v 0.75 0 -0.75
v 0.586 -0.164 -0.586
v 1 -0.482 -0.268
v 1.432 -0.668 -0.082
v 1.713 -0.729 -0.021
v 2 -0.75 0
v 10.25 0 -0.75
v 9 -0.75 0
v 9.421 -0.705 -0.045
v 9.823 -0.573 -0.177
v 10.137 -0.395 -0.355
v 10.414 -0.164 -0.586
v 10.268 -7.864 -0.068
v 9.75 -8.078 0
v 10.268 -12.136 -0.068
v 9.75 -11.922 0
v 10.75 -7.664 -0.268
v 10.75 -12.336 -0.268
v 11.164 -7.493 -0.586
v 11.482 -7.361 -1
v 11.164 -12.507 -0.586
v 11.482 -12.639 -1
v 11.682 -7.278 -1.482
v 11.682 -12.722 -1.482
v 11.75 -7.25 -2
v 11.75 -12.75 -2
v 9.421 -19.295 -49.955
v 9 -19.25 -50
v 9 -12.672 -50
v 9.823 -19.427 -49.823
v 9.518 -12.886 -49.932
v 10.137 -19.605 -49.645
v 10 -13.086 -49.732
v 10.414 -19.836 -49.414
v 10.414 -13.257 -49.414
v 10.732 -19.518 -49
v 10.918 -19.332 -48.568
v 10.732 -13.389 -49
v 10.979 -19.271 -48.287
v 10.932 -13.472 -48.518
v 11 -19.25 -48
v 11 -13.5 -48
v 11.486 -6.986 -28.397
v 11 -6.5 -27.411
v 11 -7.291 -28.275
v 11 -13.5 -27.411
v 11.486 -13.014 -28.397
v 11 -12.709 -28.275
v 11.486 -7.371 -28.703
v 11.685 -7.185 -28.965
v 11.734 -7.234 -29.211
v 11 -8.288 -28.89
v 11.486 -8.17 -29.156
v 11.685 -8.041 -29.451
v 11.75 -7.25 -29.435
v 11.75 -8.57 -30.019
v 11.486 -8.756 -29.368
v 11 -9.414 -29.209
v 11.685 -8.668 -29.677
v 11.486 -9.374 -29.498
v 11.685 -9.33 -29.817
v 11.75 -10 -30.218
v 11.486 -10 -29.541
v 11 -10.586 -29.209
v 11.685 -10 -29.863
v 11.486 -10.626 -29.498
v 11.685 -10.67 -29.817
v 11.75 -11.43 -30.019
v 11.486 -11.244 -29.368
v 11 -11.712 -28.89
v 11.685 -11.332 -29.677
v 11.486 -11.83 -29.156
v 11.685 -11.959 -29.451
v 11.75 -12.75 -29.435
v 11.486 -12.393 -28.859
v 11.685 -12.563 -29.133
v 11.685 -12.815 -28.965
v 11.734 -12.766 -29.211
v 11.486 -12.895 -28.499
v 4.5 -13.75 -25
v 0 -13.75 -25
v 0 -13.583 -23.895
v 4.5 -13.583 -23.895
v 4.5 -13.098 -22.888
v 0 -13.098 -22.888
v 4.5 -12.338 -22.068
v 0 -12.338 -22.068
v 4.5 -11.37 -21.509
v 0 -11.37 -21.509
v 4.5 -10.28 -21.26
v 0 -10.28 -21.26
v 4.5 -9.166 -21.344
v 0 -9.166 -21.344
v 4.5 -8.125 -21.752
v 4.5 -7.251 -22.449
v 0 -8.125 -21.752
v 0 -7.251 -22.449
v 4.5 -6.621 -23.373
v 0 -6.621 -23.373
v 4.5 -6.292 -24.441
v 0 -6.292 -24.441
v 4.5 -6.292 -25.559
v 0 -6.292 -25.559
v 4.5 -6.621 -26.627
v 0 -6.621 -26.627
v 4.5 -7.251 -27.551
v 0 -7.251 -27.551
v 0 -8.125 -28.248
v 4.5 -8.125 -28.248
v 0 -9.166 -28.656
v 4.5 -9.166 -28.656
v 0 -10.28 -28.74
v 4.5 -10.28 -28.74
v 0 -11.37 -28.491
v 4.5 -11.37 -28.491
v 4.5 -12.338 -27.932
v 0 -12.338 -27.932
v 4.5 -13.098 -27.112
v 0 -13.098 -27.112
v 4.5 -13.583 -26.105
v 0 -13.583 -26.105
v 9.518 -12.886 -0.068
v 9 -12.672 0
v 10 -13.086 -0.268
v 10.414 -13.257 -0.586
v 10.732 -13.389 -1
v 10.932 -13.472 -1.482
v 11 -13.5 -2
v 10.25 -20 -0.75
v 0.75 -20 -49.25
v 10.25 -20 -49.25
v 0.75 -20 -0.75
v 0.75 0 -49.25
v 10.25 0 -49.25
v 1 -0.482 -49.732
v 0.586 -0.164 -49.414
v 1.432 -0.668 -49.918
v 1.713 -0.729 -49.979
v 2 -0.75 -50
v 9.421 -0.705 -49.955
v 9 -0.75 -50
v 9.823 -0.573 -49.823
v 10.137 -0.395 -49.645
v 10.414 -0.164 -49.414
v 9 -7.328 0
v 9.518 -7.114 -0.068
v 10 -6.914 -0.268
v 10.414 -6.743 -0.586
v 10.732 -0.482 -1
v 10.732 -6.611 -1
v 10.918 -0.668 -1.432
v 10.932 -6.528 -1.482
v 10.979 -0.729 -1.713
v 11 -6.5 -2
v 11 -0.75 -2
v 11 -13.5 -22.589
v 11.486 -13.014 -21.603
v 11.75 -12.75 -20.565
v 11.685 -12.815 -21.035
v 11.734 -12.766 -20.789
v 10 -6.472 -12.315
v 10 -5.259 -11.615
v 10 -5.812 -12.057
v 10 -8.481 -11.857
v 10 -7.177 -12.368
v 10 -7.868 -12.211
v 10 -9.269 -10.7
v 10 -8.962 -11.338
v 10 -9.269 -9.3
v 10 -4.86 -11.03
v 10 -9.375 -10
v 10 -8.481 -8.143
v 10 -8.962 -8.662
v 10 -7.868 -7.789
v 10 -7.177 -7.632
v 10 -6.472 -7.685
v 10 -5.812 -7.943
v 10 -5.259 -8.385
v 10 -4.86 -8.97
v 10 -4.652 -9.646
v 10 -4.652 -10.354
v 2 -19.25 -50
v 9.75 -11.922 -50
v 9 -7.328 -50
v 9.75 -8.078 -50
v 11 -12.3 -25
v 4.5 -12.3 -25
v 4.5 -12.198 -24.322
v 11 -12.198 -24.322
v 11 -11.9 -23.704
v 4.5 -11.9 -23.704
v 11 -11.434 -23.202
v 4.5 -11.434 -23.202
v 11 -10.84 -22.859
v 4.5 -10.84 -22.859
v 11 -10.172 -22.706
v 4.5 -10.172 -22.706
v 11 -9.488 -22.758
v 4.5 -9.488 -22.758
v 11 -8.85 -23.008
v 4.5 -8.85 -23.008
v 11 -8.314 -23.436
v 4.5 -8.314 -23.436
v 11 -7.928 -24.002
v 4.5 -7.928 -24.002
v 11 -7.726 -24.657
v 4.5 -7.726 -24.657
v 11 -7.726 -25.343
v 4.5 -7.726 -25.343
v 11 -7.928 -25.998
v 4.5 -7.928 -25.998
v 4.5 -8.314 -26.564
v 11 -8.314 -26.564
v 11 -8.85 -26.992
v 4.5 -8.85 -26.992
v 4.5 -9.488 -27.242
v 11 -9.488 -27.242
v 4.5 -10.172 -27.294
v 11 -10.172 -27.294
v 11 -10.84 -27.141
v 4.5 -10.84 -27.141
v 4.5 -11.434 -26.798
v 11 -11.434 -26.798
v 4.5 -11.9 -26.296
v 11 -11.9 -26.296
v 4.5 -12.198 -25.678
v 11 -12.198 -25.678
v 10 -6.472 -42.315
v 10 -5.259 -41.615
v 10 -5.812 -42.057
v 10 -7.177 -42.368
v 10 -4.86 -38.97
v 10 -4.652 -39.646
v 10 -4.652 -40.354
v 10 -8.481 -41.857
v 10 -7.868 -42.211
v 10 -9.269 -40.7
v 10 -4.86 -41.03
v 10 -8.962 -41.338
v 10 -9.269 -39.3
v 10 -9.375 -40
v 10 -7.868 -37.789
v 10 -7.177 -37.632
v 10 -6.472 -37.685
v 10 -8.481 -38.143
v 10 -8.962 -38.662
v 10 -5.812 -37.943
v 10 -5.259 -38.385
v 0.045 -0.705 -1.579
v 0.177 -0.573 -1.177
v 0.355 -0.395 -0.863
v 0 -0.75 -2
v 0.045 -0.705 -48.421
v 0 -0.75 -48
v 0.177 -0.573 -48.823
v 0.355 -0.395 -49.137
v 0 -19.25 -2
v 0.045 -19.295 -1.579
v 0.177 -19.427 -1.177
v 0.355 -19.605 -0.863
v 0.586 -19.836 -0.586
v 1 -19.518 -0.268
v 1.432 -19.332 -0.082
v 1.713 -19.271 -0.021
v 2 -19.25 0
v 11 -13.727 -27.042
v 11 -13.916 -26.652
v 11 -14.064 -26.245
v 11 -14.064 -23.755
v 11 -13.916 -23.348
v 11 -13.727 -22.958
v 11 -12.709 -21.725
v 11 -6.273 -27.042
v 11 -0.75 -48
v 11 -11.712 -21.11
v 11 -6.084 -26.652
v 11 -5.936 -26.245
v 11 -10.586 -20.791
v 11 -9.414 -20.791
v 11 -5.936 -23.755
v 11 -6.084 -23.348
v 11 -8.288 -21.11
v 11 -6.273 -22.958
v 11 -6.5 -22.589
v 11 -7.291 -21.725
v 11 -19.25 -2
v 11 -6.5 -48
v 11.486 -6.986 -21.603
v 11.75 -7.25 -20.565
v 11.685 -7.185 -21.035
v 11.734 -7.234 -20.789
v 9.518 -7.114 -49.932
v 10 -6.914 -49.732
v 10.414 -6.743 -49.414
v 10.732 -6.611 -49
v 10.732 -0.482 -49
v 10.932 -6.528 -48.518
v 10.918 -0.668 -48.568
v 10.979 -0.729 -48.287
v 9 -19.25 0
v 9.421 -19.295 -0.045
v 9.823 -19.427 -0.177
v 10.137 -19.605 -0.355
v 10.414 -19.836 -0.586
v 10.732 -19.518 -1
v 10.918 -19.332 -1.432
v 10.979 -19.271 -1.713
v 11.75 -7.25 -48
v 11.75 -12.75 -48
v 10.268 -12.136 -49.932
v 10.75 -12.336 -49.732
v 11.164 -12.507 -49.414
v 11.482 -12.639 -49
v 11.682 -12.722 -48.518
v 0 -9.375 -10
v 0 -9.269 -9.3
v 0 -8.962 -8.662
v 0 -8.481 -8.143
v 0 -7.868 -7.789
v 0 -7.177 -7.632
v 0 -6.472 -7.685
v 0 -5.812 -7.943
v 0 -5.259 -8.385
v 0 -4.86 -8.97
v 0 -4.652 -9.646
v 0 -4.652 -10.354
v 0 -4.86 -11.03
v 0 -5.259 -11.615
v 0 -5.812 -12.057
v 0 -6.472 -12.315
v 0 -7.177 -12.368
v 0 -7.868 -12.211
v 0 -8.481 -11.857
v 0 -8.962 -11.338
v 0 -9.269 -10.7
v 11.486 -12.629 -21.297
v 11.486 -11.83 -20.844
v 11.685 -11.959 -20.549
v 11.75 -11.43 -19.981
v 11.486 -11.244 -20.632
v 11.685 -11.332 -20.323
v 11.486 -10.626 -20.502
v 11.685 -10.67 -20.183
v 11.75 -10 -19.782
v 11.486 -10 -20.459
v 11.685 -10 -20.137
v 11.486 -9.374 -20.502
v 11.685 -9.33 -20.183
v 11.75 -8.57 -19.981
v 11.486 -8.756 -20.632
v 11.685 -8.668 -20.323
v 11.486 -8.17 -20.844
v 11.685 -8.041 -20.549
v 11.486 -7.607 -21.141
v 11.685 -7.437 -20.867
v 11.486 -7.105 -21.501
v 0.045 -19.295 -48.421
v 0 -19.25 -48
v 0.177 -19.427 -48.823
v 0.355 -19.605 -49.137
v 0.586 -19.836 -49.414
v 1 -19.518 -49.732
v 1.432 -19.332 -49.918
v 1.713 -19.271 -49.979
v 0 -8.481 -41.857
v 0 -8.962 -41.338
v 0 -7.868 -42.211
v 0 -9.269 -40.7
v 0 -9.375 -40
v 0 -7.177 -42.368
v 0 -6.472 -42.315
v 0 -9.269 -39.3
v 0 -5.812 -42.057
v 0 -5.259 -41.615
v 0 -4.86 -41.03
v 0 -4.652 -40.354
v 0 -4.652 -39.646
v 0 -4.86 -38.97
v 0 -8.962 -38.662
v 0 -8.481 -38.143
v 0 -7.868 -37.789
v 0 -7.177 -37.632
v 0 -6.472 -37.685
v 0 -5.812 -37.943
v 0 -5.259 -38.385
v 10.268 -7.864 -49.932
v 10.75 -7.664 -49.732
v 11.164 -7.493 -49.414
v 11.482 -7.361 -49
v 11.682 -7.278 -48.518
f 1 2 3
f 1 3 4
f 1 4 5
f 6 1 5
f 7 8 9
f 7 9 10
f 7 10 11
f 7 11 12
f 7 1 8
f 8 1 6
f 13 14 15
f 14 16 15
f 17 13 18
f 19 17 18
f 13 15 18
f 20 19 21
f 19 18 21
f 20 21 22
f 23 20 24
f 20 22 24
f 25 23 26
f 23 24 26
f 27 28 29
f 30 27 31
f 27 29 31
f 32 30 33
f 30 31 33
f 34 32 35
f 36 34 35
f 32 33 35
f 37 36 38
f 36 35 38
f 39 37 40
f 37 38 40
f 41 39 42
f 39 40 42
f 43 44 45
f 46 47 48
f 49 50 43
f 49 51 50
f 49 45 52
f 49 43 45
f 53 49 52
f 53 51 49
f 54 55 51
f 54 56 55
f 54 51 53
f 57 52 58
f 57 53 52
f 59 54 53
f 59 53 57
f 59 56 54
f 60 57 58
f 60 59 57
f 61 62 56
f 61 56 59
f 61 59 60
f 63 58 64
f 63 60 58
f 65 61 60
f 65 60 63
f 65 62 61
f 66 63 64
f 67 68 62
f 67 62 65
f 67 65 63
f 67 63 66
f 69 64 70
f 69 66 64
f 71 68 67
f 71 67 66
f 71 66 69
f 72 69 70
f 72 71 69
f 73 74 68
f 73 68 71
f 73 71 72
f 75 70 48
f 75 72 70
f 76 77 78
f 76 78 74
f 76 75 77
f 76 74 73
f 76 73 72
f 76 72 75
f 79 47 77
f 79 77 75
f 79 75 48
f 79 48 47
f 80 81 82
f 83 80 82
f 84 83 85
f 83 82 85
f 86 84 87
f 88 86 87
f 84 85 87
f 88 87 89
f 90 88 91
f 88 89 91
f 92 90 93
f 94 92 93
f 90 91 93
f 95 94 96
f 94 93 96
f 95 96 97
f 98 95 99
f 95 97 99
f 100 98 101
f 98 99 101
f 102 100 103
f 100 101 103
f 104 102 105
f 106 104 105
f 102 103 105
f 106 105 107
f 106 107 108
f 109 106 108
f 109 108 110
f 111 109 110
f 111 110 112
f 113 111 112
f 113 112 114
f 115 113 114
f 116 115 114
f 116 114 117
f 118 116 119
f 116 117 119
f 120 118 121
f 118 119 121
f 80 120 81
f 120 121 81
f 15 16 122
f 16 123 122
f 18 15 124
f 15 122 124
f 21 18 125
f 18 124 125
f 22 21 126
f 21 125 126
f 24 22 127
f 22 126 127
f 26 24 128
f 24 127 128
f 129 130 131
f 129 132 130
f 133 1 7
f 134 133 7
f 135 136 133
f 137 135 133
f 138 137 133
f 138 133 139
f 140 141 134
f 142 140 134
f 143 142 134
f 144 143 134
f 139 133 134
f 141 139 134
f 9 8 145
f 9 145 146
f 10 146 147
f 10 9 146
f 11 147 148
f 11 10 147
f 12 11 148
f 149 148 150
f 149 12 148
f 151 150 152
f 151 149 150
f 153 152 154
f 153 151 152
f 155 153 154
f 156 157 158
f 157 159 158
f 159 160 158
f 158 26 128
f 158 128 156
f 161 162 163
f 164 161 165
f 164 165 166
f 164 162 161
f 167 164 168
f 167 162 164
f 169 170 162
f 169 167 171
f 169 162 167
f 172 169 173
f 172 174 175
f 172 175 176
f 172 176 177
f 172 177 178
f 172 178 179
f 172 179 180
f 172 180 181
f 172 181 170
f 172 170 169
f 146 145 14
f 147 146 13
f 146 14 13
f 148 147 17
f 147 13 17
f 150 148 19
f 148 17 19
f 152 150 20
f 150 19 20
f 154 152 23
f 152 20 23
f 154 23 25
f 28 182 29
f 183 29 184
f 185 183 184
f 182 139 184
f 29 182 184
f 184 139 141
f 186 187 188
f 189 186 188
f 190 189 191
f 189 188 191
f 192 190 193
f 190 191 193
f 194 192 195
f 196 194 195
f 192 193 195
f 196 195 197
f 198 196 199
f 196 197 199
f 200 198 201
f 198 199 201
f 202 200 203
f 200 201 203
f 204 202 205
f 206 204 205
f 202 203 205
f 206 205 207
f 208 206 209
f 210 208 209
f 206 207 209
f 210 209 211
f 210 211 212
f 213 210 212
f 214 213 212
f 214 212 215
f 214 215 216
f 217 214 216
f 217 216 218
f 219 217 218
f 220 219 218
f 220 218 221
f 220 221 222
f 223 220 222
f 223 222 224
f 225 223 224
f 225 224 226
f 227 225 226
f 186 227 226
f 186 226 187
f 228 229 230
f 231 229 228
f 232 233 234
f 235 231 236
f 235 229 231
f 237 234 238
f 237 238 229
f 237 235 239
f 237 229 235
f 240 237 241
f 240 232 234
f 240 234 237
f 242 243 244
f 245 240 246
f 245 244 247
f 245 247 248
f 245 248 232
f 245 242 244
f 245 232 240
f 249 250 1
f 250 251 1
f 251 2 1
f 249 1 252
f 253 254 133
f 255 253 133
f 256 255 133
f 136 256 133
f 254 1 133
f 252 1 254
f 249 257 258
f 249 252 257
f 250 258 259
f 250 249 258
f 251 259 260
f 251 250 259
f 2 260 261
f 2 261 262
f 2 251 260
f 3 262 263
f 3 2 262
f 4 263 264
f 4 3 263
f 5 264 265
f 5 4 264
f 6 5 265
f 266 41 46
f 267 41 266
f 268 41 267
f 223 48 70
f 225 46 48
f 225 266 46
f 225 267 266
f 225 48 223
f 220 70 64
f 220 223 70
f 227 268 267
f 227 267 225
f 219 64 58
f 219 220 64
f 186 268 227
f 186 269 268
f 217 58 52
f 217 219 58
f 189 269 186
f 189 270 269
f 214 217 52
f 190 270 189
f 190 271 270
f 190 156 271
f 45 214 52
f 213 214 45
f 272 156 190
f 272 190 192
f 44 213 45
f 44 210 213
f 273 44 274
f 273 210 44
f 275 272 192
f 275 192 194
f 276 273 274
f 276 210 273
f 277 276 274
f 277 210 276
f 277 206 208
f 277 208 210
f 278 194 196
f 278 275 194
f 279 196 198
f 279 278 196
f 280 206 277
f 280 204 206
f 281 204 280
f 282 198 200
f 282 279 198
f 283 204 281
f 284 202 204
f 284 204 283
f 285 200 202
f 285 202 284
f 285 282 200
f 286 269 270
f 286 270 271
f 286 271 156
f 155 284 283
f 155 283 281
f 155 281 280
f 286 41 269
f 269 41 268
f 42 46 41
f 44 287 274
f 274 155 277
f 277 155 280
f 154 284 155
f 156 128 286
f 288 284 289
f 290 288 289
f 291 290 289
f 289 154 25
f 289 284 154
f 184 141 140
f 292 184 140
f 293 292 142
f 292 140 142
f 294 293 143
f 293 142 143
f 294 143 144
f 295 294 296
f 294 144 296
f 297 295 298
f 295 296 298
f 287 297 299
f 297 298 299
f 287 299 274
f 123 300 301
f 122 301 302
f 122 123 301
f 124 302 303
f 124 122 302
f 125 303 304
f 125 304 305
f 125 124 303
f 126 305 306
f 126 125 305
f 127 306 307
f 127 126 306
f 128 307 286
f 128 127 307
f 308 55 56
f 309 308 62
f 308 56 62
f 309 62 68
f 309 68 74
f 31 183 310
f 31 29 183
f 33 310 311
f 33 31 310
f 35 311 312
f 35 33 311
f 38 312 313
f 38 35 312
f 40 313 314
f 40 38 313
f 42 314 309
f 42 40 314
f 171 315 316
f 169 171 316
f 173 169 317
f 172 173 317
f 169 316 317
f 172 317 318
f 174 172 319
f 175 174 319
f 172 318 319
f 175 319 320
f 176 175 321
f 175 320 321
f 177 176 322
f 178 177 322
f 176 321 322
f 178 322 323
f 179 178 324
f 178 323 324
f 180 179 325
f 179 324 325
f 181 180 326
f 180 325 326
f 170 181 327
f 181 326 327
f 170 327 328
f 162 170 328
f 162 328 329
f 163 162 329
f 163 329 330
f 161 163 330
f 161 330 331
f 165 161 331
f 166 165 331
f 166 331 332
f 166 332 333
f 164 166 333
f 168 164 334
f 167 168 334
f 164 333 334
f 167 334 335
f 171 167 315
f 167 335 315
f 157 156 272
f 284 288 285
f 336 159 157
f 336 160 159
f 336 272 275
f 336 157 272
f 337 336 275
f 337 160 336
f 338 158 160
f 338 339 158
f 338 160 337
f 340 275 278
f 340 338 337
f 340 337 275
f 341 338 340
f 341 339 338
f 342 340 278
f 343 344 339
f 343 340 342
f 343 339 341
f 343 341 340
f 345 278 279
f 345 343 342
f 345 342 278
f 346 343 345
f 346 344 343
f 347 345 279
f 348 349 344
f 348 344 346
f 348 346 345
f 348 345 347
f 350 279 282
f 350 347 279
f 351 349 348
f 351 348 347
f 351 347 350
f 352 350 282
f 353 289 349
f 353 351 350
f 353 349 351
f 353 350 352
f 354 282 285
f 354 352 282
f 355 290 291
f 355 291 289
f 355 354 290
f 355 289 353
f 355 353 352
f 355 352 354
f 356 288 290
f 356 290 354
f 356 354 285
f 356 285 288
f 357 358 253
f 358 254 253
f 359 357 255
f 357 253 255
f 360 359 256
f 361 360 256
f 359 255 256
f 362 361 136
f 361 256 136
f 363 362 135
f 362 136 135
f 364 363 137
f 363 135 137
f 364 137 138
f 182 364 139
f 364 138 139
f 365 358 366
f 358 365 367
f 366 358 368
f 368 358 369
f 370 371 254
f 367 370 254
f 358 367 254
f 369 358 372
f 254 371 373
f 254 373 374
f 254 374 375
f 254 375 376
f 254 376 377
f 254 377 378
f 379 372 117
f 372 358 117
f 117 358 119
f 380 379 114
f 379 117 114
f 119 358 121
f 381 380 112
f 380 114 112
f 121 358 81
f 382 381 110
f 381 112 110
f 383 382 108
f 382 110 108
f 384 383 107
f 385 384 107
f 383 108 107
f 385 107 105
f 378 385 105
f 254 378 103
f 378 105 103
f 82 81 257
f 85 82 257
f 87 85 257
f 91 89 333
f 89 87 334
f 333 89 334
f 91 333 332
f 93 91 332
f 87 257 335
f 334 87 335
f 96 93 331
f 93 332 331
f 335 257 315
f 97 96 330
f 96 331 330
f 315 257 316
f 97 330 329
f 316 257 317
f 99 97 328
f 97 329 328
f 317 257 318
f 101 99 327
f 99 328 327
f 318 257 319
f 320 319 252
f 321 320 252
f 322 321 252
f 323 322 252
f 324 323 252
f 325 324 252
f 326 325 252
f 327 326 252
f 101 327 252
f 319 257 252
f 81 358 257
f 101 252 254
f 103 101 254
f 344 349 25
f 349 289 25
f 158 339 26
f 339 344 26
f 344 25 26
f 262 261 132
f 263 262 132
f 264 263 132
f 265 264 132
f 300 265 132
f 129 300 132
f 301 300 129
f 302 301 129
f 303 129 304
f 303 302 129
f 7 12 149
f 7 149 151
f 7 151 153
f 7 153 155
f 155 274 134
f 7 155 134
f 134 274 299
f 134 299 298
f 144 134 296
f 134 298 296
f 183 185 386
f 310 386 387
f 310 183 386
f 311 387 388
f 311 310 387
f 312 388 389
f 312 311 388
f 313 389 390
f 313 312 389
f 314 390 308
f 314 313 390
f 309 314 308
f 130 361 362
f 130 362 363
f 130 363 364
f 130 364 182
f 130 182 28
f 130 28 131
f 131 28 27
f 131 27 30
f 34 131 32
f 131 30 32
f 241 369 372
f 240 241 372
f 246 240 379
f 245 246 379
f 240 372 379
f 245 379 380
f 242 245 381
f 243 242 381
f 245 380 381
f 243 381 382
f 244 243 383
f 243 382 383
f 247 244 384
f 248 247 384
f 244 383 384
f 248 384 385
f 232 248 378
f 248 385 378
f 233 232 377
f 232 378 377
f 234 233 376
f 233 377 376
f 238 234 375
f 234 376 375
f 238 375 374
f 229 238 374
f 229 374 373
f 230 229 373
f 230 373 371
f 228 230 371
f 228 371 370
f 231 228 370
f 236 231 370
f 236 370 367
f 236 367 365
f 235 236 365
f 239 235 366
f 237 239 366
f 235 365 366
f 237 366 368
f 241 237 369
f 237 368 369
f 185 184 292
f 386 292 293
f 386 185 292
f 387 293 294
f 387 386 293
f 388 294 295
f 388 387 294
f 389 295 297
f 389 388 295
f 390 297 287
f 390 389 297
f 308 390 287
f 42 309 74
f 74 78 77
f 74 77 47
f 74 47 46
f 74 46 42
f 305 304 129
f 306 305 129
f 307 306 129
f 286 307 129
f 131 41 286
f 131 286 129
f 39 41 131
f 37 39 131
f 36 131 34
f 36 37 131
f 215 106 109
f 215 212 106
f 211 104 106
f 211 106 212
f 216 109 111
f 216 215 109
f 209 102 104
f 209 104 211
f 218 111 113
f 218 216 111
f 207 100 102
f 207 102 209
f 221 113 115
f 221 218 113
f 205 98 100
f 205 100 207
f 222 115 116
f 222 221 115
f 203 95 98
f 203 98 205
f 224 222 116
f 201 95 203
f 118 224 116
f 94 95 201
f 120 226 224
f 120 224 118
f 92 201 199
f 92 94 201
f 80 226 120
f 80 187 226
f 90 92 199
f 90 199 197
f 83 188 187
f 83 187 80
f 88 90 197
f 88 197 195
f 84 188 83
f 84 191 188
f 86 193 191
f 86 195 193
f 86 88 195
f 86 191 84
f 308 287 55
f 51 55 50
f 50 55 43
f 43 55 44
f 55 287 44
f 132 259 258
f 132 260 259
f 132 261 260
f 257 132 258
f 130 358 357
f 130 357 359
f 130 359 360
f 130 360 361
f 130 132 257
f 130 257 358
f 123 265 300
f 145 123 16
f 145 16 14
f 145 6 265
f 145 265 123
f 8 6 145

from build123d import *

# Parameters (mm, degrees)
SKIZZE3_W                       = 11
SKIZZE3_H                       = 20
AUFSATZ_LINEAR_AUSTRAGEN1_DEPTH = 50
SKIZZE4_R                       = 2.375
SCHNITT_LINEAR_AUSTRAGEN1_DEPTH = 10
AUFSATZ_LINEAR_AUSTRAGEN2_DEPTH = 50
SKIZZE5_R                       = 2.3
SCHNITT_LINEAR_AUSTRAGEN2_DEPTH = 56.11862208
SKIZZE6_R                       = 3.75
SCHNITT_LINEAR_AUSTRAGEN3_DEPTH = 4.5
SKIZZE8_R                       = 4.25
SCHNITT_LINEAR_AUSTRAGEN4_DEPTH = 6.5
VERRUNDUNG1_R                   = 1
FASE1_SIZE                      = 0.75
VERRUNDUNG2_R                   = 2


with BuildPart() as part:
    # Skizze3 → Aufsatz-Linear austragen1 (new body)
    with BuildSketch(Plane.XY):
        with Locations((5.5, -10)):
            Rectangle(SKIZZE3_W, SKIZZE3_H)
    extrude(amount=-AUFSATZ_LINEAR_AUSTRAGEN1_DEPTH)

    # Skizze4 → Schnitt-Linear austragen1 (cut)
    with BuildSketch(Plane.ZY):
        with Locations(Location((-40, -7, 0), (0, 0, 270))):
            Circle(SKIZZE4_R)
        with Locations(Location((-10, -7, 0), (0, 0, 270))):
            Circle(SKIZZE4_R)
    extrude(amount=-SCHNITT_LINEAR_AUSTRAGEN1_DEPTH, mode=Mode.SUBTRACT)

    # Skizze7 → Aufsatz-Linear austragen2 (add)
    with BuildSketch(Plane.XY):
        Polygon((11, -13.5), (11, -6.5), (11.75, -7.25), (11.75, -12.75), align=None)
    extrude(amount=-AUFSATZ_LINEAR_AUSTRAGEN2_DEPTH)

    # Skizze5 → Schnitt-Linear austragen2 (cut, through all)
    with BuildSketch(Plane.ZY):
        with Locations(Location((-25, -10, 0), (0, 0, 270))):
            Circle(SKIZZE5_R)
    extrude(amount=-SCHNITT_LINEAR_AUSTRAGEN2_DEPTH, mode=Mode.SUBTRACT)

    # Skizze6 → Schnitt-Linear austragen3 (cut)
    with BuildSketch(Plane.ZY):
        with Locations(Location((-25, -10, 0), (0, 0, 270))):
            Circle(SKIZZE6_R)
    extrude(amount=-SCHNITT_LINEAR_AUSTRAGEN3_DEPTH, mode=Mode.SUBTRACT)

    # Skizze8 → Schnitt-Linear austragen4 (cut)
    with BuildSketch(Plane(origin=(11, 0, 0), x_dir=(0, 0, -1), z_dir=(1, 0, 0))):
        with Locations((25, -10)):
            Circle(SKIZZE8_R)
    extrude(amount=SCHNITT_LINEAR_AUSTRAGEN4_DEPTH, mode=Mode.SUBTRACT)

    # Verrundung1
    # the kernel refuses this fillet: 1 mm, written as the material it takes off along each edge
    with BuildSketch(Plane(origin=(11.75, -10, -25), x_dir=(0, 0.9561204309063354, -0.29297392649088017), z_dir=(0, 0.29297392649088017, 0.9561204309063354))) as verrundung1_piece_1:
        with BuildLine():
            CenterArc((5.218245837, 1), VERRUNDUNG1_R, 194.477512186, 75.522487814)
            Line((5.218245837, 0), (5.218245837, -0.02))
            Line((5.218245837, -0.02), (4.25, -0.02))
            Line((4.25, -0.02), (4.23, 0))
            ThreePointArc((4.23, 0), (4.23, 0.375), (4.230635083, 0.745))
            Line((4.230635083, 0.745), (4.25, 0.75))
        make_face()
    revolve(axis=Axis((11.75, -10, -25), (-1, 0, 0)), revolution_arc=145.927830349, mode=Mode.SUBTRACT)
    with BuildSketch(Plane(origin=(11.75, -10, -25), x_dir=(0, -0.9561204309062743, 0.292973926491079), z_dir=(0, -0.292973926491079, -0.9561204309062743))) as verrundung1_piece_2:
        with BuildLine():
            CenterArc((5.218245837, 1), VERRUNDUNG1_R, 194.477512186, 75.522487814)
            Line((5.218245837, 0), (5.218245837, -0.02))
            Line((5.218245837, -0.02), (4.25, -0.02))
            Line((4.25, -0.02), (4.23, 0))
            ThreePointArc((4.23, 0), (4.23, 0.375), (4.230635083, 0.745))
            Line((4.230635083, 0.745), (4.25, 0.75))
        make_face()
    revolve(axis=Axis((11.75, -10, -25), (-1, 0, 0)), revolution_arc=145.927830349, mode=Mode.SUBTRACT)

    # Fase1
    fase1_edges = [part.edges().sort_by_distance(p)[0] for p in [
        (5.5, -20, -50),
        (5.5, -20, 0),
        (5.5, 0, 0),
        (11, -20, -25),
        (0, -20, -25),
        (0, 0, -25),
        (11, 0, -25),
        (5.5, 0, -50),
    ]]
    chamfer(fase1_edges, length=FASE1_SIZE)

    # Verrundung2
    verrundung2_edges = [part.edges().sort_by_distance(p)[0] for p in [
        (11, -3.625, 0),
        (11, -3.625, -50),
        (11.375, -6.875, 0),
        (11.375, -13.125, 0),
        (11.75, -10, 0),
        (11.375, -6.875, -50),
        (11.75, -10, -50),
        (11.375, -13.125, -50),
        (0, -10, 0),
        (0, -10, -50),
        (11, -16.375, -50),
        (11, -16.375, 0),
    ]]
    fillet(verrundung2_edges, radius=VERRUNDUNG2_R)


solid = part.part
